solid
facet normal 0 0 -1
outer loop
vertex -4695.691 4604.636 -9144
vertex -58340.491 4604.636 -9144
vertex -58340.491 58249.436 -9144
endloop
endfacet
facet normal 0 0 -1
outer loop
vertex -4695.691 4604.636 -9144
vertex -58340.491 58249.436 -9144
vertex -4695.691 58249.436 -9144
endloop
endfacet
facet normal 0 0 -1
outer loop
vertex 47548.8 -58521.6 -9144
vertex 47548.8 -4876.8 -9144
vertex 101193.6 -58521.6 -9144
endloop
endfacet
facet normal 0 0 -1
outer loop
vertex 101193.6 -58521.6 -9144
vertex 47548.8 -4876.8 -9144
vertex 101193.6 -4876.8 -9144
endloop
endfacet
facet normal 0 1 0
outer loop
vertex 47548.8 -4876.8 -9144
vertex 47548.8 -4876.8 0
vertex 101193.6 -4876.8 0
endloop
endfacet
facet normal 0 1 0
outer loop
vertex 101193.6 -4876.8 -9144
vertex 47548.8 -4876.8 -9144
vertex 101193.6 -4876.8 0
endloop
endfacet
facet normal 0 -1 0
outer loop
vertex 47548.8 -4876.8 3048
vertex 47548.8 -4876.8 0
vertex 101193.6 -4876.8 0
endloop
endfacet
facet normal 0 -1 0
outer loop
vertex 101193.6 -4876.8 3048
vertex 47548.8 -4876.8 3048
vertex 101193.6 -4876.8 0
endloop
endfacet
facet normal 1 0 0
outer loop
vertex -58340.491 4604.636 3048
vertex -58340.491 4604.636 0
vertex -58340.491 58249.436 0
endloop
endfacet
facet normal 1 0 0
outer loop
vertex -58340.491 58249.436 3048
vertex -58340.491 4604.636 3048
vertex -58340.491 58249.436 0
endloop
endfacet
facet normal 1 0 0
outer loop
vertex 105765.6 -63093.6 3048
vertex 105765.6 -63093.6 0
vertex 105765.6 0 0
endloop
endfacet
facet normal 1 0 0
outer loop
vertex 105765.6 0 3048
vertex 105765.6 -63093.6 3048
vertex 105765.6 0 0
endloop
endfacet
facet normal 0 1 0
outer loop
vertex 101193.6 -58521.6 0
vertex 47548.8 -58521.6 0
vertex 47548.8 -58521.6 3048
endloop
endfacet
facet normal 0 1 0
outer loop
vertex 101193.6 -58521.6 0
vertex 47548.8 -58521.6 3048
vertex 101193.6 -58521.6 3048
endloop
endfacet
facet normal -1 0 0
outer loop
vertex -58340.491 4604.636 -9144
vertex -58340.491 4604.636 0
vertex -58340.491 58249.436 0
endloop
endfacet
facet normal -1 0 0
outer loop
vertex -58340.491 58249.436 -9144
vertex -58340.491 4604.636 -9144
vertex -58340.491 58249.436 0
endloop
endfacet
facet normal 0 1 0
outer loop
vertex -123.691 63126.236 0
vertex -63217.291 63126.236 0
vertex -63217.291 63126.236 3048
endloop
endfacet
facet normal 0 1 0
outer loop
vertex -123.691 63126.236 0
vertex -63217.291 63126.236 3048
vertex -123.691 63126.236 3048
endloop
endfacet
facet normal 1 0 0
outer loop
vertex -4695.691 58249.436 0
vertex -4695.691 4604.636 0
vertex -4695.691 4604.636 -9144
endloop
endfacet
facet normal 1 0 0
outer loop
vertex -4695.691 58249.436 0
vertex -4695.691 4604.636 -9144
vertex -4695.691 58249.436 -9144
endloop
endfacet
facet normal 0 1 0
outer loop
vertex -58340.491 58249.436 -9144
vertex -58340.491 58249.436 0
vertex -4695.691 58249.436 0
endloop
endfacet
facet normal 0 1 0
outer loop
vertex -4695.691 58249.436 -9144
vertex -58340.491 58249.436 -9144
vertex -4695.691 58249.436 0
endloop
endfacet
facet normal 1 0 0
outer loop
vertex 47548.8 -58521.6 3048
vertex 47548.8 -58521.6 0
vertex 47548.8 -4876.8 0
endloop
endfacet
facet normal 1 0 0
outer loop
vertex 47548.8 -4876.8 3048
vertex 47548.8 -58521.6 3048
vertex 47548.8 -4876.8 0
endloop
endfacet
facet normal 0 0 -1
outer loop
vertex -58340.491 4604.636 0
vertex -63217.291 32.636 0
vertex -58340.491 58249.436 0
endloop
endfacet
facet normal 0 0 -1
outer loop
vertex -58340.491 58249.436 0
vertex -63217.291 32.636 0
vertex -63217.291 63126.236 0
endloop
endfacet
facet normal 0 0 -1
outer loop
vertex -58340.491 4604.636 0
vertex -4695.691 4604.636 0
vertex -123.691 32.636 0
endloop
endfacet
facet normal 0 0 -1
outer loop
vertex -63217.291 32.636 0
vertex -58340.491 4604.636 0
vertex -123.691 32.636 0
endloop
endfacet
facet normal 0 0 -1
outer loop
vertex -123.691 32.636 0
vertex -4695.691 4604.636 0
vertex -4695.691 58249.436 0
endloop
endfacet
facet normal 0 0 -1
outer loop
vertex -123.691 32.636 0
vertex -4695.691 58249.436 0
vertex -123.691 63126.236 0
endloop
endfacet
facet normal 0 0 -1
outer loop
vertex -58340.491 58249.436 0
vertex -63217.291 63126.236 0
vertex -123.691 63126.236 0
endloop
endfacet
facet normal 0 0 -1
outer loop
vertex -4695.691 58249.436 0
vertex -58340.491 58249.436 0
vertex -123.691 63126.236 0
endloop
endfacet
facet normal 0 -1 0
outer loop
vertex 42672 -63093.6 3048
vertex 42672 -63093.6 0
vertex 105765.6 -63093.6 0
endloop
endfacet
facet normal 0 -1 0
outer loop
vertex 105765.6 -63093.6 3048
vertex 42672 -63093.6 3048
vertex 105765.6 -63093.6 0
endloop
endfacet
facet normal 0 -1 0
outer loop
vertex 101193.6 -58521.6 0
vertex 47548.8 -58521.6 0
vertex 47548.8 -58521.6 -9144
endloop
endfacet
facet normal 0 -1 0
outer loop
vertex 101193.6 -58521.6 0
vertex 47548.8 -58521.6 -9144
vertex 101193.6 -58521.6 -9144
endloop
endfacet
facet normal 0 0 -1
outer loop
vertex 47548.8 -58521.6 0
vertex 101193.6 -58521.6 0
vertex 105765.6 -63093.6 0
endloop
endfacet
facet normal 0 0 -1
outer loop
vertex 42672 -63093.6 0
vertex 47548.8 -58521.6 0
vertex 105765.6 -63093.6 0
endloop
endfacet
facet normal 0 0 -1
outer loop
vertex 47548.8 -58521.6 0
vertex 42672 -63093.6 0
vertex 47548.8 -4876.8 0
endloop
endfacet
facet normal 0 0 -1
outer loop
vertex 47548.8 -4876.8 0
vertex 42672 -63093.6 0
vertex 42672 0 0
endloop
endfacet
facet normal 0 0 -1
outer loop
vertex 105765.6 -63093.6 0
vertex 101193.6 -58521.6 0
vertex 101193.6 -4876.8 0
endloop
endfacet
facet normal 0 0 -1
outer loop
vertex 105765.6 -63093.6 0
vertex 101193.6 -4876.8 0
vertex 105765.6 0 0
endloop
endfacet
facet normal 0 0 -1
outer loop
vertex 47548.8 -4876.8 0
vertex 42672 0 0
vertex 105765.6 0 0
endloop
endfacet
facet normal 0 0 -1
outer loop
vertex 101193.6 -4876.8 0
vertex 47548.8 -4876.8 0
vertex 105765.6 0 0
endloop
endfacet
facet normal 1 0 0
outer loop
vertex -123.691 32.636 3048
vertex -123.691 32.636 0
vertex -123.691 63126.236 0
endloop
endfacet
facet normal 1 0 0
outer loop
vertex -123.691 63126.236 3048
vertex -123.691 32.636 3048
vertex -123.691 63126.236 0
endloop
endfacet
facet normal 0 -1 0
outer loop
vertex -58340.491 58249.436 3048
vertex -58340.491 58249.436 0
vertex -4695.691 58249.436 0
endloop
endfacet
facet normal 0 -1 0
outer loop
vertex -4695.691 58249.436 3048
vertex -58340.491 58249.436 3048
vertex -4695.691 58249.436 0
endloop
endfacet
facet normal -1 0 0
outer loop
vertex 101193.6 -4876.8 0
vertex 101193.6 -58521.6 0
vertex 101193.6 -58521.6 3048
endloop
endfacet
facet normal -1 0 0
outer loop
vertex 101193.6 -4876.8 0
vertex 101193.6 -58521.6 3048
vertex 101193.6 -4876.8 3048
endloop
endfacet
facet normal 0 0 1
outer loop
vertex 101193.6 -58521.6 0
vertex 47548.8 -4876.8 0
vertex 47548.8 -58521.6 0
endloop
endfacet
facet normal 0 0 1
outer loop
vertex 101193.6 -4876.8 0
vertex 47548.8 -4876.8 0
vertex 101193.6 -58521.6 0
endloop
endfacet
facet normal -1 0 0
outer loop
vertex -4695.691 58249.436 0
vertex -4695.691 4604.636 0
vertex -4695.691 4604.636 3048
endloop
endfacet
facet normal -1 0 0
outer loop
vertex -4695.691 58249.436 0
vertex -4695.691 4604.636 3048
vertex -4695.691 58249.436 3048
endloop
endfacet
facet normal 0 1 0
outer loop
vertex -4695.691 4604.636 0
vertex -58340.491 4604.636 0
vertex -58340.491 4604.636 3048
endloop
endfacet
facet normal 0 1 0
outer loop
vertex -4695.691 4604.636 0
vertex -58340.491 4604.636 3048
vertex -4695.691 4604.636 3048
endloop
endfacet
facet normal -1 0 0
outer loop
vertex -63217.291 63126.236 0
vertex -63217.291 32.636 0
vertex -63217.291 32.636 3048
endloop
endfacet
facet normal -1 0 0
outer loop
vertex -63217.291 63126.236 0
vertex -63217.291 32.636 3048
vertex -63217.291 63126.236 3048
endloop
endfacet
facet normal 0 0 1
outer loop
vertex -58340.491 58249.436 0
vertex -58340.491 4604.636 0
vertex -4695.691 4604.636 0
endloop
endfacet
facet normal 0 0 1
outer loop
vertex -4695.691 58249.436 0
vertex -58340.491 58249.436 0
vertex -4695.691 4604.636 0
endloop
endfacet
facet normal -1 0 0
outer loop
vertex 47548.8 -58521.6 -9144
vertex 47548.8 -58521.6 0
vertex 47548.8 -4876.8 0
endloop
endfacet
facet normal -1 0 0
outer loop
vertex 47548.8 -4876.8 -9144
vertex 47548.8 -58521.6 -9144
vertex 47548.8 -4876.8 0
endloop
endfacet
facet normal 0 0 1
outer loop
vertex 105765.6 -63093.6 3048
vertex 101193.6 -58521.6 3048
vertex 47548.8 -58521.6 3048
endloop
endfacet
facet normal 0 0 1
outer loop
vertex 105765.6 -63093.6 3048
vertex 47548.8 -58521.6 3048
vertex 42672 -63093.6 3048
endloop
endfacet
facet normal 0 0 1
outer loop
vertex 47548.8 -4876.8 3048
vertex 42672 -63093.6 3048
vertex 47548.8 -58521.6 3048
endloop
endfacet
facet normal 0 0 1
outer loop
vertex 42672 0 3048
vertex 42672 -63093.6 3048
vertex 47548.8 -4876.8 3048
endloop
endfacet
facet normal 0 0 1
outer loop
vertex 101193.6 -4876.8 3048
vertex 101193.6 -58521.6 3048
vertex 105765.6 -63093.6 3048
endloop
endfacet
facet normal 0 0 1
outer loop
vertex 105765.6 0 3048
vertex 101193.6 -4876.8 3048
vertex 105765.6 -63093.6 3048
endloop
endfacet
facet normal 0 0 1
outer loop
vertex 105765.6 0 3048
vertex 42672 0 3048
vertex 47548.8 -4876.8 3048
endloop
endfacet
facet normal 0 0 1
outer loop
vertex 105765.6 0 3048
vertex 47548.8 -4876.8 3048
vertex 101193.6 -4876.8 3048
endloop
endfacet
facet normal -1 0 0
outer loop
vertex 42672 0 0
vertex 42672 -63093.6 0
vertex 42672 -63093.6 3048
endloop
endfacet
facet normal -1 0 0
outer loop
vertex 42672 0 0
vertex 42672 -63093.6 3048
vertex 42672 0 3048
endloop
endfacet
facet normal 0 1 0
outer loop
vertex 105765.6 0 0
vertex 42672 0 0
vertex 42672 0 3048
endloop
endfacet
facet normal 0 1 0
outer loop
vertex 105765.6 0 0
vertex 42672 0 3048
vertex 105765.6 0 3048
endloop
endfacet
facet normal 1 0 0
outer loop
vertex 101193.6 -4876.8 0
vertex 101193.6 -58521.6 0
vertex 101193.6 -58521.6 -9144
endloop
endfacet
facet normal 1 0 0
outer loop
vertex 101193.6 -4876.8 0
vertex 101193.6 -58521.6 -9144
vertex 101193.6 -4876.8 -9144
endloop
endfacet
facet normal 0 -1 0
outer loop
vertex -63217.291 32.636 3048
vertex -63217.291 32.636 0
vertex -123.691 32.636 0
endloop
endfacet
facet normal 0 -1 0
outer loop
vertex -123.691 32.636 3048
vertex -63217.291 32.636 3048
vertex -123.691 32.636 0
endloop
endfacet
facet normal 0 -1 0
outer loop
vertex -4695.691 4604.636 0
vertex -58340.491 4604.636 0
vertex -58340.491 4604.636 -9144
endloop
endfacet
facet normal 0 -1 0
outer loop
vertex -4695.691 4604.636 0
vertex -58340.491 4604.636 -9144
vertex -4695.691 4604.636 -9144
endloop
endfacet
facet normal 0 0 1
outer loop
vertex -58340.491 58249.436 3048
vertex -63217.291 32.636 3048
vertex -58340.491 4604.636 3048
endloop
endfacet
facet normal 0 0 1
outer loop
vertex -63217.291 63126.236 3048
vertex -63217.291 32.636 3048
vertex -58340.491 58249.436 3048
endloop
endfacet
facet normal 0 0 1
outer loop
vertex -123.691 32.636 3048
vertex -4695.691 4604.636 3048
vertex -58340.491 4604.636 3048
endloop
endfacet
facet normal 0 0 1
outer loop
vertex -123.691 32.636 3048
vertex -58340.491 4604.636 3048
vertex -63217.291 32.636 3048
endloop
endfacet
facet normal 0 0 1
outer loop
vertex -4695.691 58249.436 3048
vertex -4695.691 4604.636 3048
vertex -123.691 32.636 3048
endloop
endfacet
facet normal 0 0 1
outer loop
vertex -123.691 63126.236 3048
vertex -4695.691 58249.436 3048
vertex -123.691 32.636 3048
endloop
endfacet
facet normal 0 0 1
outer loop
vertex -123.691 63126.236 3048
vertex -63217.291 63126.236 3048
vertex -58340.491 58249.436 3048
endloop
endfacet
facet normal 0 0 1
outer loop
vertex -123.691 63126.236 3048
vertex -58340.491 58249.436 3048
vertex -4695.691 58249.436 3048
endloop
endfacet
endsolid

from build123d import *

# Parameters (mm, degrees)
F1_W     = 53644.8
F1_H     = 53644.8
F2_DEPTH = 9144
F1_W_2   = 63093.6
F1_H_2   = 63093.6
F3_DEPTH = 3048


# Not quite as in the source:
# - a feature names something its author has since deleted; it is built from what else it names


with BuildPart() as f2:
    # F1 (on face) → F2 (new body)
    with BuildSketch(Plane.XY):
        with Locations((-31518.0906738281, 31427.0356589794)):
            Rectangle(F1_W, F1_H)
    extrude(amount=-F2_DEPTH)


with BuildPart() as f2b:
    # F1 (on face) → F2, piece 2 (new body)
    with BuildSketch(Plane.XY):
        with Locations((74371.2, -31699.2)):
            Rectangle(F1_W, F1_H)
    extrude(amount=-F2_DEPTH)


with BuildPart() as f3:
    # F1 (on face) → F3 (new body)
    with BuildSketch(Plane.XY):
        with Locations((-31670.4906738281, 31579.4356589794)):
            Rectangle(F1_W_2, F1_H_2)
        with Locations((-31518.0906738281, 31427.0356589794)):
            Rectangle(F1_W, F1_H, mode=Mode.SUBTRACT)
    extrude(amount=F3_DEPTH)


with BuildPart() as f3b:
    # F1 (on face) → F3, piece 2 (new body)
    with BuildSketch(Plane.XY):
        with Locations((74218.8, -31546.8)):
            Rectangle(F1_W_2, F1_H_2)
        with Locations((74371.2, -31699.2)):
            Rectangle(F1_W, F1_H, mode=Mode.SUBTRACT)
    extrude(amount=F3_DEPTH)


solid = Compound([f2.part, f2b.part, f3.part, f3b.part])
